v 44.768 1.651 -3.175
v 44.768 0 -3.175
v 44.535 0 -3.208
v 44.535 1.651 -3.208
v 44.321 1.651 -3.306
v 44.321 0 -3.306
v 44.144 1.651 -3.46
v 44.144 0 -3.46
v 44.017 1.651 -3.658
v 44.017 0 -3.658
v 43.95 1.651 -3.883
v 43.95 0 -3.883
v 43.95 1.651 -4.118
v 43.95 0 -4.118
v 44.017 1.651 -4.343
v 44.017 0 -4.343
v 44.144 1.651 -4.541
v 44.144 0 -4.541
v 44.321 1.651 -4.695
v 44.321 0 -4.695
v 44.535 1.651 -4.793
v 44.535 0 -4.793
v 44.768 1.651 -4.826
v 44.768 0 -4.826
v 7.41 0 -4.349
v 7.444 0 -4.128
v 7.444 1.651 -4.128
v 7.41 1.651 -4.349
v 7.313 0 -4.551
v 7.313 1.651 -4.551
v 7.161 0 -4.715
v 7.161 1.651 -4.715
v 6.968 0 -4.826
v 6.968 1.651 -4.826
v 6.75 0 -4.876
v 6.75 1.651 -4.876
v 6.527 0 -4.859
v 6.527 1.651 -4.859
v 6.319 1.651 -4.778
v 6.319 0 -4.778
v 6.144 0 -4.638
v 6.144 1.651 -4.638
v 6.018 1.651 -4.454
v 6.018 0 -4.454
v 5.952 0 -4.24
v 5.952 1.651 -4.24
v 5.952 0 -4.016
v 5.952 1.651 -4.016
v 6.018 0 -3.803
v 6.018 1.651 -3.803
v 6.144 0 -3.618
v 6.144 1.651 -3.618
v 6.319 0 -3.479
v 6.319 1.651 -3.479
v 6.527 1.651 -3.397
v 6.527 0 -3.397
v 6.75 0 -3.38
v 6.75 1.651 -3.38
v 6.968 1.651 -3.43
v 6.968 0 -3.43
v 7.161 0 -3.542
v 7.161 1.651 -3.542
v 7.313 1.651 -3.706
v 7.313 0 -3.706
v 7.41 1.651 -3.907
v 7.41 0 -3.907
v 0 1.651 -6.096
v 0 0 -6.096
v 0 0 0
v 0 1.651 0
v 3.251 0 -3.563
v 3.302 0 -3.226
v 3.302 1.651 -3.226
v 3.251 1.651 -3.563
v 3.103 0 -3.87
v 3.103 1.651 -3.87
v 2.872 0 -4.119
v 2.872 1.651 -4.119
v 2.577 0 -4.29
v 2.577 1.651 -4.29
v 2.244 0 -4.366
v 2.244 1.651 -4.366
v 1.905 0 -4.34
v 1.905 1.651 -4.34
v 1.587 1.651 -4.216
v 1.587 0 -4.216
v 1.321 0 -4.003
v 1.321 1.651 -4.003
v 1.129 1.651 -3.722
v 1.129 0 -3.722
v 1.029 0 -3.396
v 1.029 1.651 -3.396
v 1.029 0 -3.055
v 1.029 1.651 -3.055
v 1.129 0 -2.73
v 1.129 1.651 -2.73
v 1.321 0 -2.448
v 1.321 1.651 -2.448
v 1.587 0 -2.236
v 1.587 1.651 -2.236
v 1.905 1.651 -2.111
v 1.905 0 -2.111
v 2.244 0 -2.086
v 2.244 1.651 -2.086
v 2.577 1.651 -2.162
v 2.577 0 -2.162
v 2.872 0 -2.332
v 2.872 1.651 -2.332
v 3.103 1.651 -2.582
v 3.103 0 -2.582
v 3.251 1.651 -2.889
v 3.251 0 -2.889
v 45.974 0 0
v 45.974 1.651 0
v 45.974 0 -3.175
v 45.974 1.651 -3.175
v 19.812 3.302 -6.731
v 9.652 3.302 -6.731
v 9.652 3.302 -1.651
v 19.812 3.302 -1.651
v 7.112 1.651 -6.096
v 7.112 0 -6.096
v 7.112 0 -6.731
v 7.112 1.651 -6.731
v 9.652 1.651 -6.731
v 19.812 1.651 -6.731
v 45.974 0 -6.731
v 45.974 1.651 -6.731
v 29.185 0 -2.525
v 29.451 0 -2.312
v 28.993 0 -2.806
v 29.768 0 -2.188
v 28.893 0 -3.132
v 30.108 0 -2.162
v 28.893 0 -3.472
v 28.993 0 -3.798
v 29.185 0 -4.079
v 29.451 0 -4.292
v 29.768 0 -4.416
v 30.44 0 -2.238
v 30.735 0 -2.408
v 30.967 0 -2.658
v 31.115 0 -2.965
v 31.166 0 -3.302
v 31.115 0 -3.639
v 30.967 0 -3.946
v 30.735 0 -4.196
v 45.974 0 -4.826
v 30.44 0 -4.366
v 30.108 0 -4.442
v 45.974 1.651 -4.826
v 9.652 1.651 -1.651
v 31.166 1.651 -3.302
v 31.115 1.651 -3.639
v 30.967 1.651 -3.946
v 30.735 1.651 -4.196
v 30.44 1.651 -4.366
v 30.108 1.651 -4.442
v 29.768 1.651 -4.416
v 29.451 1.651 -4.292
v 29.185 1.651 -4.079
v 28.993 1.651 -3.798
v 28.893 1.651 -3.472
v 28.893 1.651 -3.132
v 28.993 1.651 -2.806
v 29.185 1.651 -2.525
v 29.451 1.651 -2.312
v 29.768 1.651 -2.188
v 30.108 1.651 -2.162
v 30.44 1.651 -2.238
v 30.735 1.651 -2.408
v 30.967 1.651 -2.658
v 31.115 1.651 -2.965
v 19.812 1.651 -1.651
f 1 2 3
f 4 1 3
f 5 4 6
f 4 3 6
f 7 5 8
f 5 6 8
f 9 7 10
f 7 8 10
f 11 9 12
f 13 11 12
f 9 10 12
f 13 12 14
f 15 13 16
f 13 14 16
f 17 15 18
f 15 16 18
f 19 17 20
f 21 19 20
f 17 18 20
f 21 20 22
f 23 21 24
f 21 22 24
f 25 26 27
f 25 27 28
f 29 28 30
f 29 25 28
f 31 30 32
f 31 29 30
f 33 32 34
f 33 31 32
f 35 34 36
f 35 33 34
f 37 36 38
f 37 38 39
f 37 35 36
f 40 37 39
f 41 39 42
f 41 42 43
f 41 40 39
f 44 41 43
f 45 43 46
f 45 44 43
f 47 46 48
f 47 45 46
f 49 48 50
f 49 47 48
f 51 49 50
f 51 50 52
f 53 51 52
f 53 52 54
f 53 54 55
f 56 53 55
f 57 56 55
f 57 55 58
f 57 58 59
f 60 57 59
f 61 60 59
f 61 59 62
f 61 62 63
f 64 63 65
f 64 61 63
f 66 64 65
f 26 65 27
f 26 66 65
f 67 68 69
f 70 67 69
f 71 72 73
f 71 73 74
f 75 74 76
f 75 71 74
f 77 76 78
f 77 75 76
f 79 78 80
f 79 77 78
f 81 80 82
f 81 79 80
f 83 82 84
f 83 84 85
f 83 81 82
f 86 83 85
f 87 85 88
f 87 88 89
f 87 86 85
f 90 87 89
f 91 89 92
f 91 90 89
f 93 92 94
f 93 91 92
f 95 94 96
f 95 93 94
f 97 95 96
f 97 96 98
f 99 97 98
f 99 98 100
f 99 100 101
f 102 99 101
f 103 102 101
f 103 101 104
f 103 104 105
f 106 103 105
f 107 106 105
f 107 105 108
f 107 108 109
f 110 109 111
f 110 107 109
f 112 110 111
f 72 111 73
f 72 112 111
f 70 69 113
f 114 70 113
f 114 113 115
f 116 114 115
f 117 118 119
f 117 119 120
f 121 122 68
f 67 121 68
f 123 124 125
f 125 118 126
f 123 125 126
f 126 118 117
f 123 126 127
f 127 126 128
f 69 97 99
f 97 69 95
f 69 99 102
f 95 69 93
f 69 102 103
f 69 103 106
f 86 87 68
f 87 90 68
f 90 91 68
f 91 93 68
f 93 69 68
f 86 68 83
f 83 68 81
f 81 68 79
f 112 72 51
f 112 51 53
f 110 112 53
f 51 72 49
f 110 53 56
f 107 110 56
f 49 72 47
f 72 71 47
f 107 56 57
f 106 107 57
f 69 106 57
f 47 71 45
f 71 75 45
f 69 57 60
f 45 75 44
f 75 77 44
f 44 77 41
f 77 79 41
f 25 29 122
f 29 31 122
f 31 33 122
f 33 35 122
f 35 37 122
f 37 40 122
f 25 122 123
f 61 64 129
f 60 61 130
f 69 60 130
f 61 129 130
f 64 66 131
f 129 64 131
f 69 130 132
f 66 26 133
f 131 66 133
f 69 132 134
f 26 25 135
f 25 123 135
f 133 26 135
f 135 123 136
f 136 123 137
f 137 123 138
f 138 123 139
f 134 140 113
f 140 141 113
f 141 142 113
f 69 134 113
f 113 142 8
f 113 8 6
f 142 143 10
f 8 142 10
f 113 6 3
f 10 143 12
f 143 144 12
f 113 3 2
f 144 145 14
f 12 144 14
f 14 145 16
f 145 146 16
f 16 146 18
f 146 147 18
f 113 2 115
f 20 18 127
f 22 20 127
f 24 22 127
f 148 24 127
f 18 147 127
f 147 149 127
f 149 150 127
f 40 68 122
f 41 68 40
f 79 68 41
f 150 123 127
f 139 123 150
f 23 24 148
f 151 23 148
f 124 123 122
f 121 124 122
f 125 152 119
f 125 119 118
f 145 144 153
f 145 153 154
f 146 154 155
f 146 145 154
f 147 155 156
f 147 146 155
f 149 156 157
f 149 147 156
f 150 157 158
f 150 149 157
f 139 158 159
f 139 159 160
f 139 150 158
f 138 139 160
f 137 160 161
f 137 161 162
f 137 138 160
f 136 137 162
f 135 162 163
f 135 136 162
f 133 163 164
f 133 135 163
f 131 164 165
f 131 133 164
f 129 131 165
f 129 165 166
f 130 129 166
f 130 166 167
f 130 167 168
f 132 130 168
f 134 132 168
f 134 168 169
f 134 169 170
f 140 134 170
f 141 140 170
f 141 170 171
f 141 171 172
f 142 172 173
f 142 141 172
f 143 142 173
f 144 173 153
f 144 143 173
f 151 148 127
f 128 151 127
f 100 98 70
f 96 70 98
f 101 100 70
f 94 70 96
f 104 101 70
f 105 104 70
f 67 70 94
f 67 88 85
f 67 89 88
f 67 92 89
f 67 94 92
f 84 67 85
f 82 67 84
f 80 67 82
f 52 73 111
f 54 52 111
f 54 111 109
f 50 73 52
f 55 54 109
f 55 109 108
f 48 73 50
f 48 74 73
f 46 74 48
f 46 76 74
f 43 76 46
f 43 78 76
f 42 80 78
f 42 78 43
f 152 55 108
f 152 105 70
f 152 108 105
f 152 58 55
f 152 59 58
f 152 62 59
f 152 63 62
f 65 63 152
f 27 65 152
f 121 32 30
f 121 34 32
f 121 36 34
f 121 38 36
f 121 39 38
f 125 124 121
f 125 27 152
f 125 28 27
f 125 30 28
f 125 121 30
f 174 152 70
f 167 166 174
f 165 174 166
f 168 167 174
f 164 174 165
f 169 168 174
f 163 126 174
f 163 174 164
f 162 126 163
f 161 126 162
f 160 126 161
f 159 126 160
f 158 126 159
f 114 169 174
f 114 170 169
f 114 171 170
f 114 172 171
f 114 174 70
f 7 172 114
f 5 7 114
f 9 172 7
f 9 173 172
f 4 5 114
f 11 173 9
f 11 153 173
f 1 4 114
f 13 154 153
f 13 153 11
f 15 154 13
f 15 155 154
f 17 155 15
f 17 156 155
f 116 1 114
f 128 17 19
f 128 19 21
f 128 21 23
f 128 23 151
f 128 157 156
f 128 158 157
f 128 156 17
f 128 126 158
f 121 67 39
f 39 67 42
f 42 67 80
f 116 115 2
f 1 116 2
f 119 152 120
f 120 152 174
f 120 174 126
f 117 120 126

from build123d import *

# Parameters (mm, degrees)
SKETCH1_R                = 1.143
SKETCH1_R_2              = 0.75
BOSS_EXTRUDE1_DEPTH      = 1.651
SKETCH2_W                = 10.16
SKETCH2_H                = 5.08
BOSS_EXTRUDE2_DEPTH      = 1.651
BOSS_EXTRUDE2_DEPTH_BACK = 1.651


with BuildPart() as part:
    # Sketch1 → Boss-Extrude1 (new body)
    with BuildSketch(Plane(origin=(0, 0, 0), x_dir=(1, 0, 0), z_dir=(0, 1, 0))):
        with BuildLine():
            Line((0, 6.096), (0, 0))
            Line((0, 0), (45.974, 0))
            Line((45.974, 0), (45.974, 3.175))
            Line((45.974, 3.175), (44.7675, 3.175))
            ThreePointArc((44.7675, 3.175), (43.942, 4.0005), (44.7675, 4.826))
            Line((44.7675, 4.826), (45.974, 4.826))
            Line((45.974, 4.826), (45.974, 6.731))
            Line((45.974, 6.731), (19.812, 6.731))
            Line((19.812, 6.731), (19.812, 1.651))
            Line((19.812, 1.651), (9.652, 1.651))
            Line((9.652, 1.651), (9.652, 6.731))
            Line((9.652, 6.731), (7.112, 6.731))
            Line((7.112, 6.731), (7.112, 6.096))
            Line((7.112, 6.096), (0, 6.096))
        make_face()
        with Locations((2.159, 3.2258)):
            Circle(SKETCH1_R, mode=Mode.SUBTRACT)
        with Locations((30.0228, 3.302)):
            Circle(SKETCH1_R, mode=Mode.SUBTRACT)
        with Locations((6.6936, 4.1282)):
            Circle(SKETCH1_R_2, mode=Mode.SUBTRACT)
    extrude(amount=BOSS_EXTRUDE1_DEPTH)

    # Sketch2 → Boss-Extrude2 (add, two sides)
    with BuildSketch(Plane(origin=(0, 1.651, 0), x_dir=(1, 0, 0), z_dir=(0, 1, 0))) as boss_extrude2_sk:
        with Locations((14.732, 4.191)):
            Rectangle(SKETCH2_W, SKETCH2_H)
    extrude(amount=BOSS_EXTRUDE2_DEPTH)
    extrude(boss_extrude2_sk.sketch, amount=-BOSS_EXTRUDE2_DEPTH_BACK)


solid = part.part
